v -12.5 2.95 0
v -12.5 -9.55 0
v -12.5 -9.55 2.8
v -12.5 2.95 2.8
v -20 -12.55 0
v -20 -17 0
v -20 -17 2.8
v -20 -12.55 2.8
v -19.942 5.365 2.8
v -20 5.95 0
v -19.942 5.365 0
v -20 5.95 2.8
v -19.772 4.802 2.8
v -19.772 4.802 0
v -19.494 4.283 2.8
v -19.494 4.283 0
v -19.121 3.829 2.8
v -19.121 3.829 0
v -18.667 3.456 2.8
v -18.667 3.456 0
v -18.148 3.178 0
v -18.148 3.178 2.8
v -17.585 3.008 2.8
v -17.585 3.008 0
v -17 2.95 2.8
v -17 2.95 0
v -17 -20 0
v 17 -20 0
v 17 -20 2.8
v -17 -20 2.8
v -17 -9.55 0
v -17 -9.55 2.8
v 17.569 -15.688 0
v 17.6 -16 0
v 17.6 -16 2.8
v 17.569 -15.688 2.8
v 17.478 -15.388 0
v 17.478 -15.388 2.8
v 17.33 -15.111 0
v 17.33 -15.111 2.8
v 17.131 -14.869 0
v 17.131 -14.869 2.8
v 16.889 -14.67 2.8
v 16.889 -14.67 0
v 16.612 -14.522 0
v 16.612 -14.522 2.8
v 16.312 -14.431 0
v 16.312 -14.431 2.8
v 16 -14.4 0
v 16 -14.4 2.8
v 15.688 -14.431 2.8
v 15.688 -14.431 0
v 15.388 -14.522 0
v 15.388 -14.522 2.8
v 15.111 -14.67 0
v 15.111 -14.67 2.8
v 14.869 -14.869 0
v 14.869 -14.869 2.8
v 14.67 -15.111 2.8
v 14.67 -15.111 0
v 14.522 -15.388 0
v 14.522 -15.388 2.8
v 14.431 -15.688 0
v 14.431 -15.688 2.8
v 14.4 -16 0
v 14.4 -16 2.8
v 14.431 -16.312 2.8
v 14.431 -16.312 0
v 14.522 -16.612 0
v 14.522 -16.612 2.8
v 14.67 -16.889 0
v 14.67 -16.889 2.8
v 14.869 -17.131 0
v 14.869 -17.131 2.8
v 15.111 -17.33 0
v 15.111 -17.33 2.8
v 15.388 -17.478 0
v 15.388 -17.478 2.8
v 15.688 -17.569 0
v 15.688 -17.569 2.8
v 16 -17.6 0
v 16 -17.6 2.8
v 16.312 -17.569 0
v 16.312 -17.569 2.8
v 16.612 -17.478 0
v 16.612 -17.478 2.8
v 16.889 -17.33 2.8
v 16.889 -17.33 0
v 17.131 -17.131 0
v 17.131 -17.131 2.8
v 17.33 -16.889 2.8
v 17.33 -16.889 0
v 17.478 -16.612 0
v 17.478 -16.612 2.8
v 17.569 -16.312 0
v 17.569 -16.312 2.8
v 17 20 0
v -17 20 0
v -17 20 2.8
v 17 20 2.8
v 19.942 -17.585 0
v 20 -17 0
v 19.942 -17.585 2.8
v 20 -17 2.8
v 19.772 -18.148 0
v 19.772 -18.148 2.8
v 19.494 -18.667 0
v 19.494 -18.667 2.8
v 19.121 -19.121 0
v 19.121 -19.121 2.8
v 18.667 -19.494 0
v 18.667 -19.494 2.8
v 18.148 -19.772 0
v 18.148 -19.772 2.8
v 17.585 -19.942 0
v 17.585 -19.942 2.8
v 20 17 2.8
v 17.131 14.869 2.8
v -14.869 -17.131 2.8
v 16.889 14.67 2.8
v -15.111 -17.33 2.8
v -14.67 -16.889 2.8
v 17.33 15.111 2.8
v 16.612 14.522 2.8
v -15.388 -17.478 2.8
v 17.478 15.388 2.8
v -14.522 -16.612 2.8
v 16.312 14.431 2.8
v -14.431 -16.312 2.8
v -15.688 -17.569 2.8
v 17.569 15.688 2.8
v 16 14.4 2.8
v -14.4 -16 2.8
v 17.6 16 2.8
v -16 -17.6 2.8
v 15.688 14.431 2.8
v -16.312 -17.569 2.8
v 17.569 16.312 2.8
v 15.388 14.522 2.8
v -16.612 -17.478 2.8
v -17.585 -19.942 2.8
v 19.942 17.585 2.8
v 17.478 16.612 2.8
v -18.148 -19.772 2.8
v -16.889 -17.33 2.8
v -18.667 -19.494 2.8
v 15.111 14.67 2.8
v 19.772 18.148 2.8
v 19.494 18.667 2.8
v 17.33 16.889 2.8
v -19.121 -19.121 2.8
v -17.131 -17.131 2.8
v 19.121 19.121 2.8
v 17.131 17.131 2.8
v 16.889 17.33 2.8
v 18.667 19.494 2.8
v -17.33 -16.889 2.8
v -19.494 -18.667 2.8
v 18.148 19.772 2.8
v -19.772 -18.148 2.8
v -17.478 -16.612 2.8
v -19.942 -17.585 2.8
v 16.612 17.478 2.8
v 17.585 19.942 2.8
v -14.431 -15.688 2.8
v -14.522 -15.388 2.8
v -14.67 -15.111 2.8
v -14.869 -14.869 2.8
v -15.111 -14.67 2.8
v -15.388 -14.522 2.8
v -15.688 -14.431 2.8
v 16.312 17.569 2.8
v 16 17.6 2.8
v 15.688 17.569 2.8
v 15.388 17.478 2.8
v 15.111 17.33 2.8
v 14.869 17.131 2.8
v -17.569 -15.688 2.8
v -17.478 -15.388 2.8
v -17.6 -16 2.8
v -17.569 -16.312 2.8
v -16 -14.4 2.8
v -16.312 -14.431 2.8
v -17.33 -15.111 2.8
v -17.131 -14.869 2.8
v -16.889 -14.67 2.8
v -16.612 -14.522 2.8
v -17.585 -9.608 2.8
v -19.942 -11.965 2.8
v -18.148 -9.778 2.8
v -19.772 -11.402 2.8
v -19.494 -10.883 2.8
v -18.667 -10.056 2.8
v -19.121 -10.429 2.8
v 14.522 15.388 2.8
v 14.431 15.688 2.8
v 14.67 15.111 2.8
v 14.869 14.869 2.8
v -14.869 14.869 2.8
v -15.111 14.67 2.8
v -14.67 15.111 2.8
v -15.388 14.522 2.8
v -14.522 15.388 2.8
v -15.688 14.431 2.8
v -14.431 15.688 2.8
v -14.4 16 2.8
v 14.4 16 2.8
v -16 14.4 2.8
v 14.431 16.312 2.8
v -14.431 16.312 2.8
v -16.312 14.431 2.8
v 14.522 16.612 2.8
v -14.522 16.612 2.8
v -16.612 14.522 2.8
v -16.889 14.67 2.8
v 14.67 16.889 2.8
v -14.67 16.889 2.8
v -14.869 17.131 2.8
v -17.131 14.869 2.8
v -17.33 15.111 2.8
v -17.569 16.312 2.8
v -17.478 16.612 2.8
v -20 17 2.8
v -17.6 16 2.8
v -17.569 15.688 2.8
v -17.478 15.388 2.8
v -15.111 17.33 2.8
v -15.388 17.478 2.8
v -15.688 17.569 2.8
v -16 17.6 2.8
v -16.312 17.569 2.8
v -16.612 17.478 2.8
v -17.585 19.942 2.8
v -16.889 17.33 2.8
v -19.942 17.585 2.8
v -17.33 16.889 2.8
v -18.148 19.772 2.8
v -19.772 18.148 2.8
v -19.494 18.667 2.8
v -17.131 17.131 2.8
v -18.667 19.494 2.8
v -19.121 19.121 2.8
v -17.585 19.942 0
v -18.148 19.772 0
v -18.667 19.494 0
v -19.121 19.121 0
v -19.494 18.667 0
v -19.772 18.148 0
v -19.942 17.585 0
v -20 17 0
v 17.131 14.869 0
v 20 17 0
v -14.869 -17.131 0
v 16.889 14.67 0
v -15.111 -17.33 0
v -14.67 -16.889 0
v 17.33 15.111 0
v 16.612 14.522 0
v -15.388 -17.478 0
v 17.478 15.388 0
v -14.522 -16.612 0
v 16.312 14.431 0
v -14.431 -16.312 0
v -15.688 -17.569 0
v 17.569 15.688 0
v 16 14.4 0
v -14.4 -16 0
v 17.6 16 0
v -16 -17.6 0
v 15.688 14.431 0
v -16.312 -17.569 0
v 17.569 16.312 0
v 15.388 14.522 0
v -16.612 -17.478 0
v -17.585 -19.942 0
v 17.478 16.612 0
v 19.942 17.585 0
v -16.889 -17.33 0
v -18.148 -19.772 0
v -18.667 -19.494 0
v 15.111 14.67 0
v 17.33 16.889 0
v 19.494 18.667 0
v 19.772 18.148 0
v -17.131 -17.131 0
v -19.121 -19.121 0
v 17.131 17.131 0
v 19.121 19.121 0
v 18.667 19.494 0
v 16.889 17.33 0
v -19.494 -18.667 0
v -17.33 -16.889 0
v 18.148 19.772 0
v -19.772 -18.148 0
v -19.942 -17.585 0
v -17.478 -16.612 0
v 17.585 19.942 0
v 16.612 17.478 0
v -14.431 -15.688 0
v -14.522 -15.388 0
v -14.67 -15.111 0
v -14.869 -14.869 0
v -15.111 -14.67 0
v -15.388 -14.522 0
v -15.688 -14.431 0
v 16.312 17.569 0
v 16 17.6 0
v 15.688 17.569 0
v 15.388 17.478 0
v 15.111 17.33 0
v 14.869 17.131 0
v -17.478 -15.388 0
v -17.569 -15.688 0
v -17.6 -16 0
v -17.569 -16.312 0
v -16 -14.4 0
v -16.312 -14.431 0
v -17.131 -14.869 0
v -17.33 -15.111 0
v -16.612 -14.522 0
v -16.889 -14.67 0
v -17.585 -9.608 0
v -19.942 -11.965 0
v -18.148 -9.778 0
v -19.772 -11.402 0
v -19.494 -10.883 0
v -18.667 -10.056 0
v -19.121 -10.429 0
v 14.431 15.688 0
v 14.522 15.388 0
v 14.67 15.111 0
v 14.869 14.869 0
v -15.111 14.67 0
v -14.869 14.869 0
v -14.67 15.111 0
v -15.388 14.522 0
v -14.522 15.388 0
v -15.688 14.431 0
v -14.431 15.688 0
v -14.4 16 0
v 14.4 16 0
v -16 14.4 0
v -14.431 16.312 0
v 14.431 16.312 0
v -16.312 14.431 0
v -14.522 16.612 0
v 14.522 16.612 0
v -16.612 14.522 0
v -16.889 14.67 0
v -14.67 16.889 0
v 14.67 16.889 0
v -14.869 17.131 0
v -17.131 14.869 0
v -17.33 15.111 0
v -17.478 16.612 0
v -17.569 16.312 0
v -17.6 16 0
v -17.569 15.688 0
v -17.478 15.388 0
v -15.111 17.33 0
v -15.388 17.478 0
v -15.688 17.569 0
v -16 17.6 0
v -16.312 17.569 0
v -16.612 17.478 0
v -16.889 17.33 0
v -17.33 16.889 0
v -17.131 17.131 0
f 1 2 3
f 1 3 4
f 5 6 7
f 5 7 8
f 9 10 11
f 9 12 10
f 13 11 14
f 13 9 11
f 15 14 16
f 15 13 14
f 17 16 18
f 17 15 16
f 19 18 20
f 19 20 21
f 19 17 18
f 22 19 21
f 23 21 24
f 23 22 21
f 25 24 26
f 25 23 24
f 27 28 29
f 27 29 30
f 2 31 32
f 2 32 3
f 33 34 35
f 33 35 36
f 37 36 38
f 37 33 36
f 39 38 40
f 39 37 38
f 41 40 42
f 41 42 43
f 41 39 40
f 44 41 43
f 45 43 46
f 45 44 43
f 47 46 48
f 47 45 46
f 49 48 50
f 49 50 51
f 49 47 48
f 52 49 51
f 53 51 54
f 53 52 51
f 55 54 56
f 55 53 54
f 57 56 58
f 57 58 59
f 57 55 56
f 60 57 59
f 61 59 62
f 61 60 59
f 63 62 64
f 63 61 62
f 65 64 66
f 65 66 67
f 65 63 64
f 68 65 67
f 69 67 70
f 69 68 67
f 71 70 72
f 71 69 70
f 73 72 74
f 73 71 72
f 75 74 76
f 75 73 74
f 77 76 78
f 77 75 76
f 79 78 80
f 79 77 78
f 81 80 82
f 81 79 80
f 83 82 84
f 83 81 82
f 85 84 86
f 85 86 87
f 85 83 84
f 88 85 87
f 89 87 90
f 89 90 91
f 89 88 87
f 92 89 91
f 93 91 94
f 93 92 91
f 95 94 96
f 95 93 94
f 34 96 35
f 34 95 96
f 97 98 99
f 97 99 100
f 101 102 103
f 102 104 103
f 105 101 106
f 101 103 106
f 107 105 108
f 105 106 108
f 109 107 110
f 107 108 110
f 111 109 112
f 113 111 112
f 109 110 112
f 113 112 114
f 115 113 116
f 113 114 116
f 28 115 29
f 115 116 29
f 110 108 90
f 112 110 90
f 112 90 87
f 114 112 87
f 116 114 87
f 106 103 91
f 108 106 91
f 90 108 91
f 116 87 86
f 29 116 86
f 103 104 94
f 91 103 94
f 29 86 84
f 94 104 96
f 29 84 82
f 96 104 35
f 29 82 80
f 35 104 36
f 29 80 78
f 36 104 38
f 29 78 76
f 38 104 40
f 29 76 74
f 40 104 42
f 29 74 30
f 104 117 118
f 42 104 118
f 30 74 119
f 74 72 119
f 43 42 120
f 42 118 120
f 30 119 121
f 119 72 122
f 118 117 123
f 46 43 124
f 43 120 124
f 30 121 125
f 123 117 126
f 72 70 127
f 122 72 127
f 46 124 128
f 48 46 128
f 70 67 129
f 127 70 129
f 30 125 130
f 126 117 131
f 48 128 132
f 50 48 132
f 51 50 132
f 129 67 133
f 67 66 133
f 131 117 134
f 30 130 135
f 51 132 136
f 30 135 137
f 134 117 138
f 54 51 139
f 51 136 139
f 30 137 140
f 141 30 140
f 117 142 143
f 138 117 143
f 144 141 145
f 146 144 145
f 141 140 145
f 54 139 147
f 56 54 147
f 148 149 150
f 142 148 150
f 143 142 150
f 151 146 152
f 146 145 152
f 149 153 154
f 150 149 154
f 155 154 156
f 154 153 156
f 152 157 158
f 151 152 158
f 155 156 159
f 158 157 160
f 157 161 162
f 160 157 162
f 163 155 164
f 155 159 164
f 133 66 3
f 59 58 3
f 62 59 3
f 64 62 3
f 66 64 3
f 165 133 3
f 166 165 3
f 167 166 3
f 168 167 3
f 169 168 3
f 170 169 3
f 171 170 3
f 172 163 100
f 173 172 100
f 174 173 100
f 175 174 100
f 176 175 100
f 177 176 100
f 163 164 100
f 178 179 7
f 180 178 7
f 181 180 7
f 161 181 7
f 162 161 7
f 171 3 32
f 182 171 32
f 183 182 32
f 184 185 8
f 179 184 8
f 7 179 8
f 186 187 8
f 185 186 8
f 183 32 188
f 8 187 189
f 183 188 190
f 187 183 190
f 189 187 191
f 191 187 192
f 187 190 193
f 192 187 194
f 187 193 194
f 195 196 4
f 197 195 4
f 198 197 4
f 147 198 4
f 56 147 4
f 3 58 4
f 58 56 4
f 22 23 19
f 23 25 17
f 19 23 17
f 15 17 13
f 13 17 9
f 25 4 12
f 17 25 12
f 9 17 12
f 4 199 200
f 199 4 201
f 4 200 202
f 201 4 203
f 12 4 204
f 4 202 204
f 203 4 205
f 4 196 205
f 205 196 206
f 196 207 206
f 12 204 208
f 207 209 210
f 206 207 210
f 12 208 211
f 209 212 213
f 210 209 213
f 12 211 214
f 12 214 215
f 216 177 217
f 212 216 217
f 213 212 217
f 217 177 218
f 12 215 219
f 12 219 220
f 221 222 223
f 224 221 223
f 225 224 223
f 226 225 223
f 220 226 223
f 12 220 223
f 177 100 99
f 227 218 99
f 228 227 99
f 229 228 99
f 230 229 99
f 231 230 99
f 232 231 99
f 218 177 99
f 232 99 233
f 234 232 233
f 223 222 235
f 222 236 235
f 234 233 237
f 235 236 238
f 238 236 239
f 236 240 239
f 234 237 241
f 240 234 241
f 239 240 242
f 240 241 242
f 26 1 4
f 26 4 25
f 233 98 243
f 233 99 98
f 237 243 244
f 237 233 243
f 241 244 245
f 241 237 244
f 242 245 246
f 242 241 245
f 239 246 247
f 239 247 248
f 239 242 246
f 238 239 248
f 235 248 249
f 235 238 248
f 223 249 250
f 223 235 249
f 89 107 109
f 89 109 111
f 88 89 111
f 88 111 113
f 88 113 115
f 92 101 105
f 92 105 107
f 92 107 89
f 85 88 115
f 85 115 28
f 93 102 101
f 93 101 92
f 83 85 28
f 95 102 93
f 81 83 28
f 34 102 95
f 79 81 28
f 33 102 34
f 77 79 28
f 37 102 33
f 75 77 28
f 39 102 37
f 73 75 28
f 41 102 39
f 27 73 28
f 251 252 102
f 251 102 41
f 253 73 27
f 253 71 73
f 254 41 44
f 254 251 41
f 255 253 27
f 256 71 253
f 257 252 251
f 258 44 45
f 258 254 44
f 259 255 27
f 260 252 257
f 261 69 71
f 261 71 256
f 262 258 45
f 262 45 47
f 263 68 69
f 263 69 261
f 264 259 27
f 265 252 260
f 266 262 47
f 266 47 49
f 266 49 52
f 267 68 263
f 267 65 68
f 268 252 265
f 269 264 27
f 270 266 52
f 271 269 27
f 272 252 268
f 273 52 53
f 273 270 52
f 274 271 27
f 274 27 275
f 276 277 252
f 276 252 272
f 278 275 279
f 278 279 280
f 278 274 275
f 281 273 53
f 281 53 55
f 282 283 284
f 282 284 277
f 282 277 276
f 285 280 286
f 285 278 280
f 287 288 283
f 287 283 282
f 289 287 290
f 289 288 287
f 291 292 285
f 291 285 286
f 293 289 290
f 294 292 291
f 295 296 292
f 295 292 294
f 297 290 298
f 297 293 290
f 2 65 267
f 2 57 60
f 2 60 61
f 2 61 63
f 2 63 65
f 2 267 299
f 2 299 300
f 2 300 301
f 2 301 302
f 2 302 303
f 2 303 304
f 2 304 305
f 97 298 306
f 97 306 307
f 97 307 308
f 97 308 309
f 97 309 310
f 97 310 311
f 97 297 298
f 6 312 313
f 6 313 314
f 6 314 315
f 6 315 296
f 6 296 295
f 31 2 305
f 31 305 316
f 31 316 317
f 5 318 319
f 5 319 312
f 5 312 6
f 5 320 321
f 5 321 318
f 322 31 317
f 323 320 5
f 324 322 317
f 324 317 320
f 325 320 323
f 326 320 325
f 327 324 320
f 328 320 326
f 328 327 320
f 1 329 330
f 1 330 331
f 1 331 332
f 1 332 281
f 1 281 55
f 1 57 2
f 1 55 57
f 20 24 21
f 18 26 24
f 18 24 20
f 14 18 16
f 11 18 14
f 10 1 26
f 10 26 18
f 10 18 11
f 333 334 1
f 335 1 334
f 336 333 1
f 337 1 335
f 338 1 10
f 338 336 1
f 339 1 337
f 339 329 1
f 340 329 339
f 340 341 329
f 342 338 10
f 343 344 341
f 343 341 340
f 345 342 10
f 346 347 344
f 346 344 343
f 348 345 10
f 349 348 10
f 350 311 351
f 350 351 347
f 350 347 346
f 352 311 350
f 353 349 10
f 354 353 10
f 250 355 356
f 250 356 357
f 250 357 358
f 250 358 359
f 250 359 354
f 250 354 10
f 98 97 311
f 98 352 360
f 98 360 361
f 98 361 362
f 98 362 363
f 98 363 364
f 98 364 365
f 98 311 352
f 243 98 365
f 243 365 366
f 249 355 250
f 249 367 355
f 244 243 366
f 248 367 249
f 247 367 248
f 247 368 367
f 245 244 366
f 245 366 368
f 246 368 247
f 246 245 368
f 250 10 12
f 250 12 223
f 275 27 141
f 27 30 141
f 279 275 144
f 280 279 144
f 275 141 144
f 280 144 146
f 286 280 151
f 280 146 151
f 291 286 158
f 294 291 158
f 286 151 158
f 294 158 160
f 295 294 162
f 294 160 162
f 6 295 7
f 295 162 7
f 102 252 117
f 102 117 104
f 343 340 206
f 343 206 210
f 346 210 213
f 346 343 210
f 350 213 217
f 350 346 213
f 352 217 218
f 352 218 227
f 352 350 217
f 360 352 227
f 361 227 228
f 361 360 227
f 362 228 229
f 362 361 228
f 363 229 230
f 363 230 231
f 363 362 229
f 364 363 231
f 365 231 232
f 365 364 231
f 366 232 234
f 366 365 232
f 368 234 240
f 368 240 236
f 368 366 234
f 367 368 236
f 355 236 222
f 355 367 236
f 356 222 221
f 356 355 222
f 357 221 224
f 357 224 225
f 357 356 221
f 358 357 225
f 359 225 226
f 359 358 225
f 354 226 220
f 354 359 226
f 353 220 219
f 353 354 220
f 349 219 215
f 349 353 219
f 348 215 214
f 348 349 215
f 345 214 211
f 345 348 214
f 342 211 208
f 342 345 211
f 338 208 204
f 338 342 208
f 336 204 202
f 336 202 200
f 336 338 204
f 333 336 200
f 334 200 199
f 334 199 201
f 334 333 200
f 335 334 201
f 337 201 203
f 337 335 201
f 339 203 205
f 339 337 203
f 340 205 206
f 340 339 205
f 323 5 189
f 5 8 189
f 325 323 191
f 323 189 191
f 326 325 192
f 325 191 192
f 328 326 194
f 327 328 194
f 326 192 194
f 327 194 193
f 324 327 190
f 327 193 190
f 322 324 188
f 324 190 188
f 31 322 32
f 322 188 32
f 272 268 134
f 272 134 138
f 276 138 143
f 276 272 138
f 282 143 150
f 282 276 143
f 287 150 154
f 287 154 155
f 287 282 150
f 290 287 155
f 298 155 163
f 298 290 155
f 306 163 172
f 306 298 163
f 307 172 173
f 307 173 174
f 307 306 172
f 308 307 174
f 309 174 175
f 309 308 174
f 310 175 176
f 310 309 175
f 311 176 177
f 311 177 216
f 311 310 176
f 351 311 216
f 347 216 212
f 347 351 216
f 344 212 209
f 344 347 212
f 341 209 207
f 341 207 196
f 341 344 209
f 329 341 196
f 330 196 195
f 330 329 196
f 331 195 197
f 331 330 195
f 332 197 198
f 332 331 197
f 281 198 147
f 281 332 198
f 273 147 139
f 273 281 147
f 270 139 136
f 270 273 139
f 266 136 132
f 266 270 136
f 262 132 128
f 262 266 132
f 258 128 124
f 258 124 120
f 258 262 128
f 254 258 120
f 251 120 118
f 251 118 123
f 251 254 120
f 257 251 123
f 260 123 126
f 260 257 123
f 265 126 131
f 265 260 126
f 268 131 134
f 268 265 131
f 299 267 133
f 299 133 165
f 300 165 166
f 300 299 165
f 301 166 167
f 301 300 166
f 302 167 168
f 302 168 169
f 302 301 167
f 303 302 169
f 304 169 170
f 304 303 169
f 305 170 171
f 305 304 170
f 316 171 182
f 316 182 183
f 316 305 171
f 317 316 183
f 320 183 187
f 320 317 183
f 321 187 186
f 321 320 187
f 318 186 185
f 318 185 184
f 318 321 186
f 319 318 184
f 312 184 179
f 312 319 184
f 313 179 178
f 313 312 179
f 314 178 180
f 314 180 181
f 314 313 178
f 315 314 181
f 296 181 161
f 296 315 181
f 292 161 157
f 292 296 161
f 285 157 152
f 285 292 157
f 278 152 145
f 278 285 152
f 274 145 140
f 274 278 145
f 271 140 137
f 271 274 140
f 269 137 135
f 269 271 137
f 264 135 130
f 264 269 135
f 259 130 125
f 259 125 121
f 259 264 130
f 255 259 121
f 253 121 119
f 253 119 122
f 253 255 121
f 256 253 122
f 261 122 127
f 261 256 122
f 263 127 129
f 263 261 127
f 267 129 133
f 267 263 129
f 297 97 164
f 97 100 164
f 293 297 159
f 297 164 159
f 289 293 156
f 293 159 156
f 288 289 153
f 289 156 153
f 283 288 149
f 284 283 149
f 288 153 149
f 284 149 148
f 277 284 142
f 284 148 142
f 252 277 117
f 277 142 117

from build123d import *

# Parameters (mm, degrees)
SKETCH1_R           = 1.6
BOSS_EXTRUDE1_DEPTH = 2.8
FILLET1_R           = 3


with BuildPart() as part:
    # Sketch1 → Boss-Extrude1 (new body)
    with BuildSketch(Plane.XY):
        Polygon((-20, 20), (20, 20), (20, -20), (-20, -20), (-20, -9.55), (-12.5, -9.55), (-12.5, 2.95), (-20, 2.95), align=None)
        with Locations((-16, 16)):
            Circle(SKETCH1_R, mode=Mode.SUBTRACT)
        with Locations((16, 16)):
            Circle(SKETCH1_R, mode=Mode.SUBTRACT)
        with Locations((16, -16)):
            Circle(SKETCH1_R, mode=Mode.SUBTRACT)
        with Locations((-16, -16)):
            Circle(SKETCH1_R, mode=Mode.SUBTRACT)
    extrude(amount=BOSS_EXTRUDE1_DEPTH)

    # Fillet1
    fillet1_edges = [part.edges().sort_by_distance(p)[0] for p in [
        (20, -20, 1.4),
        (-20, -20, 1.4),
        (-20, -9.55, 1.4),
        (-20, 2.95, 1.4),
        (-20, 20, 1.4),
        (20, 20, 1.4),
    ]]
    fillet(fillet1_edges, radius=FILLET1_R)


solid = part.part
